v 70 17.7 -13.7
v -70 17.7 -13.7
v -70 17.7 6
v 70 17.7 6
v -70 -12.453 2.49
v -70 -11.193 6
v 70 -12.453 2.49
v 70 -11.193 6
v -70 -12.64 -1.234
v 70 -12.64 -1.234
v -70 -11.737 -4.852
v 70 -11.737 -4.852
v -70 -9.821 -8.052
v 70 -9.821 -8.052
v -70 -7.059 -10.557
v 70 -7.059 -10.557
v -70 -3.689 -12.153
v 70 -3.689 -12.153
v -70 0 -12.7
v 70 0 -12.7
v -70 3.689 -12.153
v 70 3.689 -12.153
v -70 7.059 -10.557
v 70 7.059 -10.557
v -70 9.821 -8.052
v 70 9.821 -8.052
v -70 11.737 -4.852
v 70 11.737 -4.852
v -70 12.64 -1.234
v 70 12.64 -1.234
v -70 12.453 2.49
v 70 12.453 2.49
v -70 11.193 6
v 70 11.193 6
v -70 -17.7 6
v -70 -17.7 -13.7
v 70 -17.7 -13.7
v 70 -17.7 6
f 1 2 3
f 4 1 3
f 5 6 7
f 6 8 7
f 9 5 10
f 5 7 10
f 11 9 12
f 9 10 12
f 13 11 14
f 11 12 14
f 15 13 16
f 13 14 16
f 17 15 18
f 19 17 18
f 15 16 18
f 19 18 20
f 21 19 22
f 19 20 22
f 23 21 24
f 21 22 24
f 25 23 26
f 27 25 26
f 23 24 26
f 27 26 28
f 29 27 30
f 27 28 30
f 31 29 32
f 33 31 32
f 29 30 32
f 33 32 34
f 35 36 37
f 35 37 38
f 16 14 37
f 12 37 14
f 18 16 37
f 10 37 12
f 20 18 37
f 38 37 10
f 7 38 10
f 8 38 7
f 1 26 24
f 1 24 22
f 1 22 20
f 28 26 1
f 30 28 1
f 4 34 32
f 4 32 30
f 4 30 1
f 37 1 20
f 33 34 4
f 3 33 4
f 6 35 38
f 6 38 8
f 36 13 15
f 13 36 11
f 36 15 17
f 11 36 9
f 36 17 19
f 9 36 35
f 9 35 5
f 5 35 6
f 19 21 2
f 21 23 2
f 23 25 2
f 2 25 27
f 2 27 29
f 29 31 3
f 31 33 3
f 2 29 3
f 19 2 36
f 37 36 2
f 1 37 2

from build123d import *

# Parameters (mm, degrees)
F1_R          = 12.7
F2_DEPTH      = 70
F2_DEPTH_BACK = 70
F3_W          = 35.4
F3_H          = 19.7
F4_DEPTH      = 70
F4_DEPTH_BACK = 70


with BuildPart() as f2:
    # F1 (on Right) → F2 (new body, two sides)
    with BuildSketch(Plane.YZ) as f2_sk:
        Circle(F1_R)
    extrude(amount=F2_DEPTH)
    extrude(f2_sk.sketch, amount=-F2_DEPTH_BACK)


with BuildPart() as f4:
    # F3 (on Right) → F4 (new body, two sides)
    with BuildSketch(Plane.YZ) as f4_sk:
        with Locations((0, -3.85)):
            Rectangle(F3_W, F3_H)
    extrude(amount=F4_DEPTH)
    extrude(f4_sk.sketch, amount=-F4_DEPTH_BACK)

    # F5: cut F2
    add(f2.part, mode=Mode.SUBTRACT)


solid = f4.part
